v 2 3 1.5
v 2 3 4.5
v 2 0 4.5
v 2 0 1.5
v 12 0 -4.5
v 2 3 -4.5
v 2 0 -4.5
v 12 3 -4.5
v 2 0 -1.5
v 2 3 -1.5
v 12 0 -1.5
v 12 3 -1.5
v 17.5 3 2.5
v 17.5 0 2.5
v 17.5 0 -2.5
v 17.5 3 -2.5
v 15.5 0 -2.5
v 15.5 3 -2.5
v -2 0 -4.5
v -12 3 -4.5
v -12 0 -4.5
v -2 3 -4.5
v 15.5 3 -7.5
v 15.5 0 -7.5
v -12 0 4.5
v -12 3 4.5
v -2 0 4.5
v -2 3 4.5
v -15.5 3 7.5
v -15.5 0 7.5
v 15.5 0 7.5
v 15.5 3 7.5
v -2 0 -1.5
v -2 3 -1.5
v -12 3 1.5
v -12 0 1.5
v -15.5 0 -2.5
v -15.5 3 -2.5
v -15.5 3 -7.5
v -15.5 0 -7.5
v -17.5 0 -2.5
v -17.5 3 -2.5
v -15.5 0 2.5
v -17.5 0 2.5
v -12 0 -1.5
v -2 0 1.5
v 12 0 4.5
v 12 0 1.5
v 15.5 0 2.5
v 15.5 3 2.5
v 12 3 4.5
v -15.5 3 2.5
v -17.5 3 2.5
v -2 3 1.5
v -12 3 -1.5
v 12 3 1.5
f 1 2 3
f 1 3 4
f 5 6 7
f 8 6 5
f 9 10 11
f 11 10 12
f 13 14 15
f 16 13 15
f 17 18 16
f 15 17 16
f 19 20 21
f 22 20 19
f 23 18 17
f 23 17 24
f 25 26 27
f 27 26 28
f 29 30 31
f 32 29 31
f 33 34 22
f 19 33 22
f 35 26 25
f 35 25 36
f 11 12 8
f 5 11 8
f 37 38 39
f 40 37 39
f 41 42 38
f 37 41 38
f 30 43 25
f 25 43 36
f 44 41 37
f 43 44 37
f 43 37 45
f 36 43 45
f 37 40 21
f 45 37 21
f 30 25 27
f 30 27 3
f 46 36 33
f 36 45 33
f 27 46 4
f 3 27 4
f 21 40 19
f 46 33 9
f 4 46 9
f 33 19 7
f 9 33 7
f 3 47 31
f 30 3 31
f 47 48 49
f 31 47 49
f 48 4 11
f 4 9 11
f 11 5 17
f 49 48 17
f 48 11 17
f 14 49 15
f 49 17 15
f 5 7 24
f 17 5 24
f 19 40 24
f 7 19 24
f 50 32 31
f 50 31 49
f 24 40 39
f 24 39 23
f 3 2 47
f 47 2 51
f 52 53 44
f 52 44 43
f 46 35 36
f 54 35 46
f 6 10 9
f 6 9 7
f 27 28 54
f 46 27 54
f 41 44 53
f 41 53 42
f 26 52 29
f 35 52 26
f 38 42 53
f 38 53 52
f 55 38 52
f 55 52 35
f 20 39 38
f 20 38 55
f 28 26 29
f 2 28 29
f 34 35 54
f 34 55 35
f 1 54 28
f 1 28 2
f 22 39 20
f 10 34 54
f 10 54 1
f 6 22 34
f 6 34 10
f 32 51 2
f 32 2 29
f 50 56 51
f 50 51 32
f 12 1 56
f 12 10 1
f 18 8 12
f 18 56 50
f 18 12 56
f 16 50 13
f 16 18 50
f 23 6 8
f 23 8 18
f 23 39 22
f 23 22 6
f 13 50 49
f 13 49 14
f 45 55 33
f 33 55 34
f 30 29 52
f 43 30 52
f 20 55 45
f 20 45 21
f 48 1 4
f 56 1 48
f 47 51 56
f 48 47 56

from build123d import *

# Parameters (mm, degrees)
SKETCH1_W           = 35
SKETCH1_H           = 15
BOSS_EXTRUDE1_DEPTH = 3
SKETCH2_W           = 10
SKETCH2_H           = 3
CUT_EXTRUDE1_DEPTH  = 3
SKETCH3_W           = 2
SKETCH3_H           = 5
CUT_EXTRUDE2_DEPTH  = 3


with BuildPart() as part:
    # Sketch1 → Boss-Extrude1 (new body)
    with BuildSketch(Plane(origin=(0, 0, 0), x_dir=(1, 0, 0), z_dir=(0, 1, 0))):
        Rectangle(SKETCH1_W, SKETCH1_H)
    extrude(amount=BOSS_EXTRUDE1_DEPTH)

    # Sketch2 → Cut-Extrude1 (cut)
    with BuildSketch(Plane(origin=(0, 3, 0), x_dir=(1, 0, 0), z_dir=(0, 1, 0))):
        with Locations((-7, -3)):
            Rectangle(SKETCH2_W, SKETCH2_H)
        with Locations((-7, 3)):
            Rectangle(SKETCH2_W, SKETCH2_H)
        with Locations((7, -3)):
            Rectangle(SKETCH2_W, SKETCH2_H)
        with Locations((7, 3)):
            Rectangle(SKETCH2_W, SKETCH2_H)
    extrude(amount=-CUT_EXTRUDE1_DEPTH, mode=Mode.SUBTRACT)

    # Sketch3 → Cut-Extrude2 (cut)
    with BuildSketch(Plane(origin=(0, 3, 0), x_dir=(1, 0, 0), z_dir=(0, 1, 0))):
        with Locations((16.5, 5)):
            Rectangle(SKETCH3_W, SKETCH3_H)
        with Locations((16.5, -5)):
            Rectangle(SKETCH3_W, SKETCH3_H)
        with Locations((-16.5, -5)):
            Rectangle(SKETCH3_W, SKETCH3_H)
        with Locations((-16.5, 5)):
            Rectangle(SKETCH3_W, SKETCH3_H)
    extrude(amount=-CUT_EXTRUDE2_DEPTH, mode=Mode.SUBTRACT)


solid = part.part
